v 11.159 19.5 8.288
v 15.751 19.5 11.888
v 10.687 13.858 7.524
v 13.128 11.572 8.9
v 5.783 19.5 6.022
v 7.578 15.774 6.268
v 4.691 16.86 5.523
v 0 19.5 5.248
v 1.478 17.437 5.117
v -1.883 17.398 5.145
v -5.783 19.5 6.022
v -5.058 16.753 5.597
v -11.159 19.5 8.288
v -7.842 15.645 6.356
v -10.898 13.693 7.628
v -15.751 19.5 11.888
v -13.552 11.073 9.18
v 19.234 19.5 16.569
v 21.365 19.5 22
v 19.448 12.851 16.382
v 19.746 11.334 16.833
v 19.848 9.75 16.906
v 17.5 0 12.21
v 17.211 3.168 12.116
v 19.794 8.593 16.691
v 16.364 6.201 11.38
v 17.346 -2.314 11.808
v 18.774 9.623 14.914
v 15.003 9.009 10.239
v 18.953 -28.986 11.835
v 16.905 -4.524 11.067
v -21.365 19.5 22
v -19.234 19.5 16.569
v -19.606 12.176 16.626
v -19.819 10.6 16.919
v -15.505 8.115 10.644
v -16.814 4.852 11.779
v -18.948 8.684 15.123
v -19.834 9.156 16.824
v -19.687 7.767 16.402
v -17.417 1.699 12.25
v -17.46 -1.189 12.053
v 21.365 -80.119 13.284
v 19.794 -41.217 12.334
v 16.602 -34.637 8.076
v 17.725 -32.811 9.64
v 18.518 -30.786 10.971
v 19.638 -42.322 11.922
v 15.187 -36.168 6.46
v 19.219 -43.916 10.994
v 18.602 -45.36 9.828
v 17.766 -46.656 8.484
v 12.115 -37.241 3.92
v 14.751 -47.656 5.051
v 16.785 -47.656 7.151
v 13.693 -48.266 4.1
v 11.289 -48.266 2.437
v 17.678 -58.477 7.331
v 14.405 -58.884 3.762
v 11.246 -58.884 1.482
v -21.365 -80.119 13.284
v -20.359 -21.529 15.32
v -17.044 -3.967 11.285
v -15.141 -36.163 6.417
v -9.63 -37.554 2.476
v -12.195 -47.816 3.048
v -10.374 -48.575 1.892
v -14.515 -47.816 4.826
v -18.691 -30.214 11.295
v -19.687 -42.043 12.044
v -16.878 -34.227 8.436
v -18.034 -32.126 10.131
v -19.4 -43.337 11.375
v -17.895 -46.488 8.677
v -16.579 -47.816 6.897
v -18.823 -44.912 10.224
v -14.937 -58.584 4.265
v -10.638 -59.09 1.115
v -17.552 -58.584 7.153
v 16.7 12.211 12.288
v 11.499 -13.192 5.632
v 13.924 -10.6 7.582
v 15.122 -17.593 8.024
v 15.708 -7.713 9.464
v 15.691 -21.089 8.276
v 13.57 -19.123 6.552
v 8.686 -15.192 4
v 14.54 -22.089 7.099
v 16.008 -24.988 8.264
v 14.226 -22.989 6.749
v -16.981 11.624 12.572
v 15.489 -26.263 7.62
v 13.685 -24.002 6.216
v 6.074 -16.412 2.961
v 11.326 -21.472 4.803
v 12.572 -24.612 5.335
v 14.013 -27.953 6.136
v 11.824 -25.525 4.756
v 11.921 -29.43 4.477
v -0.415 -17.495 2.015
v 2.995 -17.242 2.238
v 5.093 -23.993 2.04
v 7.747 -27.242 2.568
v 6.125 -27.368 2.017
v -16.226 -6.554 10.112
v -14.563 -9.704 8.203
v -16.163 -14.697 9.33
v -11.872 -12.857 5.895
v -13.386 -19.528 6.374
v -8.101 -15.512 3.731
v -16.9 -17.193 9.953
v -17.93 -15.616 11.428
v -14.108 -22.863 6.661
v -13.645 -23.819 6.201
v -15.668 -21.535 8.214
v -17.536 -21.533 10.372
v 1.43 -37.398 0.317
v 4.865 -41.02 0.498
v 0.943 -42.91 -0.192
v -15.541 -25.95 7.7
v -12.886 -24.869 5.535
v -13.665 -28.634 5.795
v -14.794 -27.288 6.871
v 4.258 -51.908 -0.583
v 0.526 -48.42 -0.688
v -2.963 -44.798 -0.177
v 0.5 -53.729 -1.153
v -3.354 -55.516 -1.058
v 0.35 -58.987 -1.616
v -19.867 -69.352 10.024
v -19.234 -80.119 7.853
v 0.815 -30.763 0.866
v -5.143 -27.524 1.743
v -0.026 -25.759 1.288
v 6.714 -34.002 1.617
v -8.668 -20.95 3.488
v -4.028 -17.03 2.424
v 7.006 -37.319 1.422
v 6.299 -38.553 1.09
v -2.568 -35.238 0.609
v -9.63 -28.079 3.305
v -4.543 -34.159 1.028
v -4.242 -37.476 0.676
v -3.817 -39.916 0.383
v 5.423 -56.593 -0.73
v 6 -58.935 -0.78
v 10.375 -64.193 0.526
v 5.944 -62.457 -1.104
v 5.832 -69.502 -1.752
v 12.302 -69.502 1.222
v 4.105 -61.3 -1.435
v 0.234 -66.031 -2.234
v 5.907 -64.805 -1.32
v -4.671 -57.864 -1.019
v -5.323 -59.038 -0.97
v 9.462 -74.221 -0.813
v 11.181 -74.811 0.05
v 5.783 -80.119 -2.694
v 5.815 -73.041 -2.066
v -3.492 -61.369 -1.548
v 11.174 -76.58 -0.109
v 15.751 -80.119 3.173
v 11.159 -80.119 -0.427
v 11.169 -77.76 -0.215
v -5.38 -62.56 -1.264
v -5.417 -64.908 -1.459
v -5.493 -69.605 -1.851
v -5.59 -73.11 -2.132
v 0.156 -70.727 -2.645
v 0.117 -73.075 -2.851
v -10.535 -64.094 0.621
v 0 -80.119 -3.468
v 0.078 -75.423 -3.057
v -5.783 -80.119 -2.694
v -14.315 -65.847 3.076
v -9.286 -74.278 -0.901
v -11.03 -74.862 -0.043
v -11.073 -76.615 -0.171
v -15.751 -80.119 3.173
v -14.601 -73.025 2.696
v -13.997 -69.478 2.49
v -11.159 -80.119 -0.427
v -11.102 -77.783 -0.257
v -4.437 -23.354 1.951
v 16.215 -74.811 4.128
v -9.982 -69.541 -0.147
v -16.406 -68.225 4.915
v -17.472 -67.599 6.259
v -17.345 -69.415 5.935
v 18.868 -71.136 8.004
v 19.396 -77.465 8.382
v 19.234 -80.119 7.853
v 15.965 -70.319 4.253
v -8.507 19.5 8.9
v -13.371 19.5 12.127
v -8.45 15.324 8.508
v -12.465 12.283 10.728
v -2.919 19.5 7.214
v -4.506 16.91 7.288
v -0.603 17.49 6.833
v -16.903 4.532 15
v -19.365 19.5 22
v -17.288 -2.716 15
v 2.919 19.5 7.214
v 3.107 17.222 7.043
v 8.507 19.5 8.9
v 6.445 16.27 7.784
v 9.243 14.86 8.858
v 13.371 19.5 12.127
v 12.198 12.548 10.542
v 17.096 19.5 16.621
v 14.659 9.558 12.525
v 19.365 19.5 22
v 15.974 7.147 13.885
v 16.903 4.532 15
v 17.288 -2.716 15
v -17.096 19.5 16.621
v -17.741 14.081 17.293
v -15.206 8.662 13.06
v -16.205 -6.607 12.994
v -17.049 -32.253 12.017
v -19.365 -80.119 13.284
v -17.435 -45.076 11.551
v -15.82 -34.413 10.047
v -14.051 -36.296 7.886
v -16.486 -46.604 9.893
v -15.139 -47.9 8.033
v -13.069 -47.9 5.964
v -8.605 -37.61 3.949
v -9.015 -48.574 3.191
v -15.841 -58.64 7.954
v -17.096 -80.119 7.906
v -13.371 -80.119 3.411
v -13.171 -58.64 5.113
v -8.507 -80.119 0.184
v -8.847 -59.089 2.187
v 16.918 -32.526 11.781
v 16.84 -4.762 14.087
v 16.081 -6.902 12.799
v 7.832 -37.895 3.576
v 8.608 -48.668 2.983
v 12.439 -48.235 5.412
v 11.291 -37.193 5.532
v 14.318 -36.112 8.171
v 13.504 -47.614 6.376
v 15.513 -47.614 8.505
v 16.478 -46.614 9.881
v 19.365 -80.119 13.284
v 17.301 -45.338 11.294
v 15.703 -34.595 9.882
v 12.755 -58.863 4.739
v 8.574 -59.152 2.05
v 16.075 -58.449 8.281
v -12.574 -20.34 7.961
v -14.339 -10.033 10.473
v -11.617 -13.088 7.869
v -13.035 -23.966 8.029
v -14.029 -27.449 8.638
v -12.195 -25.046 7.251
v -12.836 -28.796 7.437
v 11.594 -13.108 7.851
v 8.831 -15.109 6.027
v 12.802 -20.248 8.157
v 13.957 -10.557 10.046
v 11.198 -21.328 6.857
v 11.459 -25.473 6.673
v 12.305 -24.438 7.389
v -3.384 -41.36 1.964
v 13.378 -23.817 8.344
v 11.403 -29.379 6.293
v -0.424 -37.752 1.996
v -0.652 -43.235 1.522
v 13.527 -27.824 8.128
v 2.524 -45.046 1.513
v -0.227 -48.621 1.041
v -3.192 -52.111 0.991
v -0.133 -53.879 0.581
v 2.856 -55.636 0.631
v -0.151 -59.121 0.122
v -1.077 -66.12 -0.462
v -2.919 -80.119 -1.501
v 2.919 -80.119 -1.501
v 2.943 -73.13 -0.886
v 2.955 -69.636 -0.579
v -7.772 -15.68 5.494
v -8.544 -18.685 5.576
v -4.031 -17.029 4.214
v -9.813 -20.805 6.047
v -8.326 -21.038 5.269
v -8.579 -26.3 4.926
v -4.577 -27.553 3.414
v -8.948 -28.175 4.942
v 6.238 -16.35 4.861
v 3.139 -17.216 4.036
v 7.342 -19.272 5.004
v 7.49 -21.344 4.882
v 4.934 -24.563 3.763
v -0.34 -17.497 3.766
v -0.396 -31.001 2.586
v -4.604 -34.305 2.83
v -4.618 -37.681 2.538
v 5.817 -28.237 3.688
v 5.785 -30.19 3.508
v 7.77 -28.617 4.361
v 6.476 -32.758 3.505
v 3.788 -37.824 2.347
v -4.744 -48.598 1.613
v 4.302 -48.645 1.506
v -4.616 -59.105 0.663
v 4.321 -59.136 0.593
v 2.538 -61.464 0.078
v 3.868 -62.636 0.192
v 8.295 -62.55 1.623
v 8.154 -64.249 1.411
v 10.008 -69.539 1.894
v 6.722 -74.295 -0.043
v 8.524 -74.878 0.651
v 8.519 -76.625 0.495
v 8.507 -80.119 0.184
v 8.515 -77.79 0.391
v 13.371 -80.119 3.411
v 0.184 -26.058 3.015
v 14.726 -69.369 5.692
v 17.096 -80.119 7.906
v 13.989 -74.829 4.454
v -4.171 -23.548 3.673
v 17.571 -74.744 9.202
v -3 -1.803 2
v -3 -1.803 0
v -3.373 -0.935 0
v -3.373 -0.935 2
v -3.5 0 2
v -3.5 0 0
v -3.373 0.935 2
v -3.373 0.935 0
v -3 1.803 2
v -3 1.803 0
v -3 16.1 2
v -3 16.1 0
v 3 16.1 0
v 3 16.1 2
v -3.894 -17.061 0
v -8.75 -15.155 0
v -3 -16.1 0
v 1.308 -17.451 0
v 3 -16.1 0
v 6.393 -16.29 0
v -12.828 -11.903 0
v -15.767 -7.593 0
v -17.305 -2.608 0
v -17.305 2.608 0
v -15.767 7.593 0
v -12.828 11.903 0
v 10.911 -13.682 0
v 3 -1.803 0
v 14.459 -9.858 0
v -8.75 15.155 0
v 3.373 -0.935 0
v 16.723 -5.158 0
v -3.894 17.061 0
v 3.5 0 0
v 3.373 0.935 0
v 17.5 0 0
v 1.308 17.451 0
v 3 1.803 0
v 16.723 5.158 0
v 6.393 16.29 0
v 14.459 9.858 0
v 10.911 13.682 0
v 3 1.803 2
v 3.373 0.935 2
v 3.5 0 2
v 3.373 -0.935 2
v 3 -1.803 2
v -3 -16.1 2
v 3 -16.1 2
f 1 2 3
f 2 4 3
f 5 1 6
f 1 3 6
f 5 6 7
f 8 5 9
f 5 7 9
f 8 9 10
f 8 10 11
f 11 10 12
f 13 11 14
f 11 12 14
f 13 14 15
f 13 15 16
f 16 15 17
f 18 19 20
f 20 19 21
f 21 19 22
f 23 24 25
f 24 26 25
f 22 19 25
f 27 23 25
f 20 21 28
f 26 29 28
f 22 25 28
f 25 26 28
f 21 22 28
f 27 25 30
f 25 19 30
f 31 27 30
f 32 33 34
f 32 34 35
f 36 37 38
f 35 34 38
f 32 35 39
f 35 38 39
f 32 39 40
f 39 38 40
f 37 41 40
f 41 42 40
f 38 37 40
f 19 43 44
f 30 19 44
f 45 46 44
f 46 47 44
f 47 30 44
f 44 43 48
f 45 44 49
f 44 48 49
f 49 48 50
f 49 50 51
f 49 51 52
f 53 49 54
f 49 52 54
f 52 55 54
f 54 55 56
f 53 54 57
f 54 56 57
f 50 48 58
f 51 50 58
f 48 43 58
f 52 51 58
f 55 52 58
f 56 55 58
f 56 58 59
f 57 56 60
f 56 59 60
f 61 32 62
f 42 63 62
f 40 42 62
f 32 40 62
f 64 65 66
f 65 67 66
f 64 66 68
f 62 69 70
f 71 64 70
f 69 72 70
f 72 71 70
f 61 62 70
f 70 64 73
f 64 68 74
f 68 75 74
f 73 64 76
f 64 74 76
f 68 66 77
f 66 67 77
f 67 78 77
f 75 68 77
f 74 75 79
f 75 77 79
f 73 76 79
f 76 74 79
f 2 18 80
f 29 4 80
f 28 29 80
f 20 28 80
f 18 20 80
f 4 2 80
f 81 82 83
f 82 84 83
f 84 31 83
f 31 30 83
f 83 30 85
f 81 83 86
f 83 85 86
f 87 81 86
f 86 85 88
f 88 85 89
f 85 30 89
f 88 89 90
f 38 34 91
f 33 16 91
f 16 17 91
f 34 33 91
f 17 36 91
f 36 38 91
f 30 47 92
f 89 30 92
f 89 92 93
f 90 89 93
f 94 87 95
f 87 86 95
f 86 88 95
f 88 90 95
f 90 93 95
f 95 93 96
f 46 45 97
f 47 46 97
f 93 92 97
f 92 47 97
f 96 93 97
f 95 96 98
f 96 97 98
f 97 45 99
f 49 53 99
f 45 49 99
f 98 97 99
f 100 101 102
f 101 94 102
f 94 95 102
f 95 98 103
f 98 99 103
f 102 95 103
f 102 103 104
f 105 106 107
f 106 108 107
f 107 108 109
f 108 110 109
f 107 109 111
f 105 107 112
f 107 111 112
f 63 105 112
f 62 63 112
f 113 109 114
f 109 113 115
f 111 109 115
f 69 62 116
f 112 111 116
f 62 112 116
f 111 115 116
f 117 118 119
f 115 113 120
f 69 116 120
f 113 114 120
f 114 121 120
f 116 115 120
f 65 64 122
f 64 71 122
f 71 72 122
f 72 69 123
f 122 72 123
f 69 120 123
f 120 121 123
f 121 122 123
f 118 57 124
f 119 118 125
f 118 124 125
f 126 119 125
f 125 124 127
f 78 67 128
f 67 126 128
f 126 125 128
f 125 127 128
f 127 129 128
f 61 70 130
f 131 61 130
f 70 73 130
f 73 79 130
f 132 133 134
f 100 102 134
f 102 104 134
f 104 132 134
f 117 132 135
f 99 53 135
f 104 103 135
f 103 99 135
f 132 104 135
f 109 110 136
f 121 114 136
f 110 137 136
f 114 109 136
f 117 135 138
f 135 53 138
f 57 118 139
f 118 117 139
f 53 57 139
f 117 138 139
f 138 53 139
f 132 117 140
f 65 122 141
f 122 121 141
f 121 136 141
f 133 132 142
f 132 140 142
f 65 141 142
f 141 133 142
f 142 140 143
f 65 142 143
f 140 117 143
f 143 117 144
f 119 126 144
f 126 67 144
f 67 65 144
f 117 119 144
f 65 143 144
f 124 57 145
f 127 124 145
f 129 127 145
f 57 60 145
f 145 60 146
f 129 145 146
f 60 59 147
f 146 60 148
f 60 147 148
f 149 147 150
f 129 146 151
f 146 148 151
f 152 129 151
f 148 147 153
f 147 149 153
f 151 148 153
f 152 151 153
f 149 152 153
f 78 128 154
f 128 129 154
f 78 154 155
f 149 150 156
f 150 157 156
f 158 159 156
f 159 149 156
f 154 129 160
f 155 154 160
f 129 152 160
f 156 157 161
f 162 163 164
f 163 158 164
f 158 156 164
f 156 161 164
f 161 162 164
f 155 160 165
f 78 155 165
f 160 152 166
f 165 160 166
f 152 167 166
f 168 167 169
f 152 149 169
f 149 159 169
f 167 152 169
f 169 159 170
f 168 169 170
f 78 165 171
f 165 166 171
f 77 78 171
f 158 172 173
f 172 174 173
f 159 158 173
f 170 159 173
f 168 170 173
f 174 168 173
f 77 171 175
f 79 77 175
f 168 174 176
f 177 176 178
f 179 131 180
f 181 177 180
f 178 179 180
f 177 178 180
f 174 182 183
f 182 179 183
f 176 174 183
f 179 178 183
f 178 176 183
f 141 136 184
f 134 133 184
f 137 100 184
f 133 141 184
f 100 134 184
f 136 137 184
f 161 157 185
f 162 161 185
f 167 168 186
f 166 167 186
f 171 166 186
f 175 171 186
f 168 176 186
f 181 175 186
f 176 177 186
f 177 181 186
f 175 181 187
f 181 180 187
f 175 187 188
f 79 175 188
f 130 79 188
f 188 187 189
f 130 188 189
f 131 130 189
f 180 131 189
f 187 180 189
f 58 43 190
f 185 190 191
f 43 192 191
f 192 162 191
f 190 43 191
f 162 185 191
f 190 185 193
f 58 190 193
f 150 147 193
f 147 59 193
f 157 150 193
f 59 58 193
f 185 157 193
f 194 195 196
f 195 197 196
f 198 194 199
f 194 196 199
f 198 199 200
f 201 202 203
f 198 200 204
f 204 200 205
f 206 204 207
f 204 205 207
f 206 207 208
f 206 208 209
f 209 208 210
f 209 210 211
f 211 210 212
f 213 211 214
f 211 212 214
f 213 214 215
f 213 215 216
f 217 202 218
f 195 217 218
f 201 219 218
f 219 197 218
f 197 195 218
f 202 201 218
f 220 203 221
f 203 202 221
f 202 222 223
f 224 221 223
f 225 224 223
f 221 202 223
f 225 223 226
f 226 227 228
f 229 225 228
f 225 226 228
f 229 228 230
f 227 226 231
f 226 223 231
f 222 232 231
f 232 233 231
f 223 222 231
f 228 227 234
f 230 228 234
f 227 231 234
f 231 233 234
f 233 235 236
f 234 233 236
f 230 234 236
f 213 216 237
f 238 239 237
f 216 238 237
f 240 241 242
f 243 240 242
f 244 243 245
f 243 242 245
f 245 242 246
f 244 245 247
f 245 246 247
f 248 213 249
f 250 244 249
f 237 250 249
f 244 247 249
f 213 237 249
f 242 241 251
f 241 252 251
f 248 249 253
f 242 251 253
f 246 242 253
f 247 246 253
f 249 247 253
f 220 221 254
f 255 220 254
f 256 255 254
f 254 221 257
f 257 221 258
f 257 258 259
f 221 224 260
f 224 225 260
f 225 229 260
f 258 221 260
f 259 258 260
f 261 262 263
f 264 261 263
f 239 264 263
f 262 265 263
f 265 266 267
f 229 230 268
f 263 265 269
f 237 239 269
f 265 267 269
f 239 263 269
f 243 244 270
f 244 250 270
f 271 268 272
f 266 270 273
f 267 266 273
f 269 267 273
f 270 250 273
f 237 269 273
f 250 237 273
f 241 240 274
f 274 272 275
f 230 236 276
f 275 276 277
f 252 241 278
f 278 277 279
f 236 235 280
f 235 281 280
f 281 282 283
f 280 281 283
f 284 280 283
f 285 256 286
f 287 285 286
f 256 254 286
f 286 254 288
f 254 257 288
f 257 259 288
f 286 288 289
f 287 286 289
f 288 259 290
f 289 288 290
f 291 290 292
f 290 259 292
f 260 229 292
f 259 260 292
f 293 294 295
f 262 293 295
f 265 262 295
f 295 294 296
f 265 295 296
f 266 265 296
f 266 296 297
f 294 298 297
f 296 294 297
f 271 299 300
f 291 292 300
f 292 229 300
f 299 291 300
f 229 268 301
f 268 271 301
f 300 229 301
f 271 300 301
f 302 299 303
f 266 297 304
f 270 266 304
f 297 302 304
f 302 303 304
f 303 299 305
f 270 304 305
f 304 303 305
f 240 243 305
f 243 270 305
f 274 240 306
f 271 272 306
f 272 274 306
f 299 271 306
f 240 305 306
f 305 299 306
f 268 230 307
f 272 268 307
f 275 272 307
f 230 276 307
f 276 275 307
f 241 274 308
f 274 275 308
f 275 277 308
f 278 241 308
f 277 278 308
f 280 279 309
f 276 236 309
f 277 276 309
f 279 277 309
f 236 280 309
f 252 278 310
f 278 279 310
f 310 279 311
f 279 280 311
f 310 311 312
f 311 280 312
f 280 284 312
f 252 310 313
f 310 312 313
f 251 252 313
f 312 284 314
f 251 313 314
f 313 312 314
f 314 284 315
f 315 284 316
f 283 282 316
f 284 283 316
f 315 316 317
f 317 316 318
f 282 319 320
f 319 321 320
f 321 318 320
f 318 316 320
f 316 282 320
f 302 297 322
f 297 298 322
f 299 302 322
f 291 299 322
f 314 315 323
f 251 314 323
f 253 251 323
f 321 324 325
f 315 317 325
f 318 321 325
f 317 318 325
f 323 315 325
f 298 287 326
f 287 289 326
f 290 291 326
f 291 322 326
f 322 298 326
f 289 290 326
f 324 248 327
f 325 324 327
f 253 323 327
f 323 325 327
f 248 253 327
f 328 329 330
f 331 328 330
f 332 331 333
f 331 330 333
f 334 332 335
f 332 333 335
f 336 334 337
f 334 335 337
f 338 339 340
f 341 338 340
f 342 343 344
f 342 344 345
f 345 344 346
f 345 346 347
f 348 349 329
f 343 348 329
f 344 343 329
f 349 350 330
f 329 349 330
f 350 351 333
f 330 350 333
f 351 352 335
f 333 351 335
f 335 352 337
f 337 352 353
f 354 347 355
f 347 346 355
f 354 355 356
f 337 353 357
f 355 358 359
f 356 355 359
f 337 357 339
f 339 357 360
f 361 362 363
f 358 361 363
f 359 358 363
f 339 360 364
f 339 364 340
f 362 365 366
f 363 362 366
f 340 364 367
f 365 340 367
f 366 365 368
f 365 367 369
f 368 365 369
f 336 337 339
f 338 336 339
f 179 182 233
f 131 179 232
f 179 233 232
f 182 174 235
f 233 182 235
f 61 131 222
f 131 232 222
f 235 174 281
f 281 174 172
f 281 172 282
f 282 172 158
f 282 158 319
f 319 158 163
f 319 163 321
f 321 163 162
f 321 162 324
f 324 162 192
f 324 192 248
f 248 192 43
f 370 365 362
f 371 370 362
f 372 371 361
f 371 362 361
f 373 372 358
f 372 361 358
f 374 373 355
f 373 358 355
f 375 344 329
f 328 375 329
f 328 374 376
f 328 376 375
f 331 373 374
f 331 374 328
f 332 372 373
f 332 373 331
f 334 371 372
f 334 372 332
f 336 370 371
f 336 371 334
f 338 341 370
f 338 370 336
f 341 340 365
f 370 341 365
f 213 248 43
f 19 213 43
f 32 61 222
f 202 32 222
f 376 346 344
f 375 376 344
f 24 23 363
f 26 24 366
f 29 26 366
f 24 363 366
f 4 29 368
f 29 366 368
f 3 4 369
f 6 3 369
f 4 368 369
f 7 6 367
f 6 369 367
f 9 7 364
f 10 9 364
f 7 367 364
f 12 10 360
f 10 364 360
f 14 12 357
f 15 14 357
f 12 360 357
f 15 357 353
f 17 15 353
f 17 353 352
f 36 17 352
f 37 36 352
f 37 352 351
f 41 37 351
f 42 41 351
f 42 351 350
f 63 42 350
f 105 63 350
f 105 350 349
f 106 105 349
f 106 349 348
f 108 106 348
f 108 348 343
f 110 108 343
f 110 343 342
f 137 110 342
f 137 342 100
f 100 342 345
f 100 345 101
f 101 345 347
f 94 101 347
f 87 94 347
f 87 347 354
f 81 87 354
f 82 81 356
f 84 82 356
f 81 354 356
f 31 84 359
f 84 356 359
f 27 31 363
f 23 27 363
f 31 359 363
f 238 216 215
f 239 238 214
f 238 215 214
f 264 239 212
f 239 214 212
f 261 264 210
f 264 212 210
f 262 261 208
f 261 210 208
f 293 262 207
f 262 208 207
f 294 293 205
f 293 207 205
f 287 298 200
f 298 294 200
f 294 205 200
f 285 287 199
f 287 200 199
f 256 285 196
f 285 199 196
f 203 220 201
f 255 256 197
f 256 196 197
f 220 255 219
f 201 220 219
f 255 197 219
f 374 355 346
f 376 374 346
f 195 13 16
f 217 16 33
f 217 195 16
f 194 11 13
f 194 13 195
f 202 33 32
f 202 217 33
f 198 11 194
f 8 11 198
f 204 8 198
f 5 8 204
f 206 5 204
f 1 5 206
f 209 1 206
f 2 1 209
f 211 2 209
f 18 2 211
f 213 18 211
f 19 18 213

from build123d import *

# Parameters (mm, degrees)
SKETCH1_R           = 17.5
BOSS_EXTRUDE1_DEPTH = 15
CUT_EXTRUDE1_DEPTH  = 2
SKETCH9_R           = 20
CUT_EXTRUDE2_DEPTH  = 100.381983754


with BuildPart() as part:
    # Sketch1 → Boss-Extrude1 (new body)
    with BuildSketch(Plane.XY):
        Circle(SKETCH1_R)
    extrude(amount=BOSS_EXTRUDE1_DEPTH)

    # Sketch2 → Cut-Extrude1 (cut)
    with BuildSketch(Plane(origin=(0, 0, 0), x_dir=(-1, 0, 0), z_dir=(0, 0, -1))):
        with BuildLine():
            Line((3, 1.802775638), (3, 16.1))
            Line((3, 16.1), (-3, 16.1))
            Line((-3, 16.1), (-3, 1.802775638))
            ThreePointArc((-3, 1.802775638), (-3.5, 0), (-3, -1.802775638))
            Line((-3, -1.802775638), (-3, -16.1))
            Line((-3, -16.1), (3, -16.1))
            Line((3, -16.1), (3, -1.802775638))
            ThreePointArc((3, -1.802775638), (3.5, 0), (3, 1.802775638))
        make_face()
    extrude(amount=-CUT_EXTRUDE1_DEPTH, mode=Mode.SUBTRACT)

    # Sweep1: sweep along a path in Sketch8
    with BuildLine(Plane(origin=(0, 0, 0), x_dir=(0, 0, -1), z_dir=(1, 0, 0))) as sweep1_path:
        Line((-5.24788844, 19.5), (3.467685835, -80.119469809))
    # Sketch5 → Sweep1 (sweep)
    with BuildSketch(Plane(origin=(0, 19.5, 0), x_dir=(1, 0, 0), z_dir=(0, 1, 0))):
        with BuildLine():
            Line((-21.364916731, -22), (-19.364916731, -22))
            ThreePointArc((-19.364916731, -22), (0, -7), (19.364916731, -22))
            Line((19.364916731, -22), (21.364916731, -22))
            ThreePointArc((21.364916731, -22), (0, -5.24788844), (-21.364916731, -22))
        make_face()
    sweep(path=sweep1_path.line)

    # Sketch9 → Cut-Extrude2 (cut, along a direction that is not the sketch's normal)
    with BuildSketch(Plane(origin=(0, 19.5, 0), x_dir=(1, 0, 0), z_dir=(0, 1, 0))):
        with Locations((0, -27)):
            Circle(SKETCH9_R)
    extrude(amount=-CUT_EXTRUDE2_DEPTH, dir=(0, 0.9961946980917461, 0.08715574274765157), mode=Mode.SUBTRACT)


solid = part.part
